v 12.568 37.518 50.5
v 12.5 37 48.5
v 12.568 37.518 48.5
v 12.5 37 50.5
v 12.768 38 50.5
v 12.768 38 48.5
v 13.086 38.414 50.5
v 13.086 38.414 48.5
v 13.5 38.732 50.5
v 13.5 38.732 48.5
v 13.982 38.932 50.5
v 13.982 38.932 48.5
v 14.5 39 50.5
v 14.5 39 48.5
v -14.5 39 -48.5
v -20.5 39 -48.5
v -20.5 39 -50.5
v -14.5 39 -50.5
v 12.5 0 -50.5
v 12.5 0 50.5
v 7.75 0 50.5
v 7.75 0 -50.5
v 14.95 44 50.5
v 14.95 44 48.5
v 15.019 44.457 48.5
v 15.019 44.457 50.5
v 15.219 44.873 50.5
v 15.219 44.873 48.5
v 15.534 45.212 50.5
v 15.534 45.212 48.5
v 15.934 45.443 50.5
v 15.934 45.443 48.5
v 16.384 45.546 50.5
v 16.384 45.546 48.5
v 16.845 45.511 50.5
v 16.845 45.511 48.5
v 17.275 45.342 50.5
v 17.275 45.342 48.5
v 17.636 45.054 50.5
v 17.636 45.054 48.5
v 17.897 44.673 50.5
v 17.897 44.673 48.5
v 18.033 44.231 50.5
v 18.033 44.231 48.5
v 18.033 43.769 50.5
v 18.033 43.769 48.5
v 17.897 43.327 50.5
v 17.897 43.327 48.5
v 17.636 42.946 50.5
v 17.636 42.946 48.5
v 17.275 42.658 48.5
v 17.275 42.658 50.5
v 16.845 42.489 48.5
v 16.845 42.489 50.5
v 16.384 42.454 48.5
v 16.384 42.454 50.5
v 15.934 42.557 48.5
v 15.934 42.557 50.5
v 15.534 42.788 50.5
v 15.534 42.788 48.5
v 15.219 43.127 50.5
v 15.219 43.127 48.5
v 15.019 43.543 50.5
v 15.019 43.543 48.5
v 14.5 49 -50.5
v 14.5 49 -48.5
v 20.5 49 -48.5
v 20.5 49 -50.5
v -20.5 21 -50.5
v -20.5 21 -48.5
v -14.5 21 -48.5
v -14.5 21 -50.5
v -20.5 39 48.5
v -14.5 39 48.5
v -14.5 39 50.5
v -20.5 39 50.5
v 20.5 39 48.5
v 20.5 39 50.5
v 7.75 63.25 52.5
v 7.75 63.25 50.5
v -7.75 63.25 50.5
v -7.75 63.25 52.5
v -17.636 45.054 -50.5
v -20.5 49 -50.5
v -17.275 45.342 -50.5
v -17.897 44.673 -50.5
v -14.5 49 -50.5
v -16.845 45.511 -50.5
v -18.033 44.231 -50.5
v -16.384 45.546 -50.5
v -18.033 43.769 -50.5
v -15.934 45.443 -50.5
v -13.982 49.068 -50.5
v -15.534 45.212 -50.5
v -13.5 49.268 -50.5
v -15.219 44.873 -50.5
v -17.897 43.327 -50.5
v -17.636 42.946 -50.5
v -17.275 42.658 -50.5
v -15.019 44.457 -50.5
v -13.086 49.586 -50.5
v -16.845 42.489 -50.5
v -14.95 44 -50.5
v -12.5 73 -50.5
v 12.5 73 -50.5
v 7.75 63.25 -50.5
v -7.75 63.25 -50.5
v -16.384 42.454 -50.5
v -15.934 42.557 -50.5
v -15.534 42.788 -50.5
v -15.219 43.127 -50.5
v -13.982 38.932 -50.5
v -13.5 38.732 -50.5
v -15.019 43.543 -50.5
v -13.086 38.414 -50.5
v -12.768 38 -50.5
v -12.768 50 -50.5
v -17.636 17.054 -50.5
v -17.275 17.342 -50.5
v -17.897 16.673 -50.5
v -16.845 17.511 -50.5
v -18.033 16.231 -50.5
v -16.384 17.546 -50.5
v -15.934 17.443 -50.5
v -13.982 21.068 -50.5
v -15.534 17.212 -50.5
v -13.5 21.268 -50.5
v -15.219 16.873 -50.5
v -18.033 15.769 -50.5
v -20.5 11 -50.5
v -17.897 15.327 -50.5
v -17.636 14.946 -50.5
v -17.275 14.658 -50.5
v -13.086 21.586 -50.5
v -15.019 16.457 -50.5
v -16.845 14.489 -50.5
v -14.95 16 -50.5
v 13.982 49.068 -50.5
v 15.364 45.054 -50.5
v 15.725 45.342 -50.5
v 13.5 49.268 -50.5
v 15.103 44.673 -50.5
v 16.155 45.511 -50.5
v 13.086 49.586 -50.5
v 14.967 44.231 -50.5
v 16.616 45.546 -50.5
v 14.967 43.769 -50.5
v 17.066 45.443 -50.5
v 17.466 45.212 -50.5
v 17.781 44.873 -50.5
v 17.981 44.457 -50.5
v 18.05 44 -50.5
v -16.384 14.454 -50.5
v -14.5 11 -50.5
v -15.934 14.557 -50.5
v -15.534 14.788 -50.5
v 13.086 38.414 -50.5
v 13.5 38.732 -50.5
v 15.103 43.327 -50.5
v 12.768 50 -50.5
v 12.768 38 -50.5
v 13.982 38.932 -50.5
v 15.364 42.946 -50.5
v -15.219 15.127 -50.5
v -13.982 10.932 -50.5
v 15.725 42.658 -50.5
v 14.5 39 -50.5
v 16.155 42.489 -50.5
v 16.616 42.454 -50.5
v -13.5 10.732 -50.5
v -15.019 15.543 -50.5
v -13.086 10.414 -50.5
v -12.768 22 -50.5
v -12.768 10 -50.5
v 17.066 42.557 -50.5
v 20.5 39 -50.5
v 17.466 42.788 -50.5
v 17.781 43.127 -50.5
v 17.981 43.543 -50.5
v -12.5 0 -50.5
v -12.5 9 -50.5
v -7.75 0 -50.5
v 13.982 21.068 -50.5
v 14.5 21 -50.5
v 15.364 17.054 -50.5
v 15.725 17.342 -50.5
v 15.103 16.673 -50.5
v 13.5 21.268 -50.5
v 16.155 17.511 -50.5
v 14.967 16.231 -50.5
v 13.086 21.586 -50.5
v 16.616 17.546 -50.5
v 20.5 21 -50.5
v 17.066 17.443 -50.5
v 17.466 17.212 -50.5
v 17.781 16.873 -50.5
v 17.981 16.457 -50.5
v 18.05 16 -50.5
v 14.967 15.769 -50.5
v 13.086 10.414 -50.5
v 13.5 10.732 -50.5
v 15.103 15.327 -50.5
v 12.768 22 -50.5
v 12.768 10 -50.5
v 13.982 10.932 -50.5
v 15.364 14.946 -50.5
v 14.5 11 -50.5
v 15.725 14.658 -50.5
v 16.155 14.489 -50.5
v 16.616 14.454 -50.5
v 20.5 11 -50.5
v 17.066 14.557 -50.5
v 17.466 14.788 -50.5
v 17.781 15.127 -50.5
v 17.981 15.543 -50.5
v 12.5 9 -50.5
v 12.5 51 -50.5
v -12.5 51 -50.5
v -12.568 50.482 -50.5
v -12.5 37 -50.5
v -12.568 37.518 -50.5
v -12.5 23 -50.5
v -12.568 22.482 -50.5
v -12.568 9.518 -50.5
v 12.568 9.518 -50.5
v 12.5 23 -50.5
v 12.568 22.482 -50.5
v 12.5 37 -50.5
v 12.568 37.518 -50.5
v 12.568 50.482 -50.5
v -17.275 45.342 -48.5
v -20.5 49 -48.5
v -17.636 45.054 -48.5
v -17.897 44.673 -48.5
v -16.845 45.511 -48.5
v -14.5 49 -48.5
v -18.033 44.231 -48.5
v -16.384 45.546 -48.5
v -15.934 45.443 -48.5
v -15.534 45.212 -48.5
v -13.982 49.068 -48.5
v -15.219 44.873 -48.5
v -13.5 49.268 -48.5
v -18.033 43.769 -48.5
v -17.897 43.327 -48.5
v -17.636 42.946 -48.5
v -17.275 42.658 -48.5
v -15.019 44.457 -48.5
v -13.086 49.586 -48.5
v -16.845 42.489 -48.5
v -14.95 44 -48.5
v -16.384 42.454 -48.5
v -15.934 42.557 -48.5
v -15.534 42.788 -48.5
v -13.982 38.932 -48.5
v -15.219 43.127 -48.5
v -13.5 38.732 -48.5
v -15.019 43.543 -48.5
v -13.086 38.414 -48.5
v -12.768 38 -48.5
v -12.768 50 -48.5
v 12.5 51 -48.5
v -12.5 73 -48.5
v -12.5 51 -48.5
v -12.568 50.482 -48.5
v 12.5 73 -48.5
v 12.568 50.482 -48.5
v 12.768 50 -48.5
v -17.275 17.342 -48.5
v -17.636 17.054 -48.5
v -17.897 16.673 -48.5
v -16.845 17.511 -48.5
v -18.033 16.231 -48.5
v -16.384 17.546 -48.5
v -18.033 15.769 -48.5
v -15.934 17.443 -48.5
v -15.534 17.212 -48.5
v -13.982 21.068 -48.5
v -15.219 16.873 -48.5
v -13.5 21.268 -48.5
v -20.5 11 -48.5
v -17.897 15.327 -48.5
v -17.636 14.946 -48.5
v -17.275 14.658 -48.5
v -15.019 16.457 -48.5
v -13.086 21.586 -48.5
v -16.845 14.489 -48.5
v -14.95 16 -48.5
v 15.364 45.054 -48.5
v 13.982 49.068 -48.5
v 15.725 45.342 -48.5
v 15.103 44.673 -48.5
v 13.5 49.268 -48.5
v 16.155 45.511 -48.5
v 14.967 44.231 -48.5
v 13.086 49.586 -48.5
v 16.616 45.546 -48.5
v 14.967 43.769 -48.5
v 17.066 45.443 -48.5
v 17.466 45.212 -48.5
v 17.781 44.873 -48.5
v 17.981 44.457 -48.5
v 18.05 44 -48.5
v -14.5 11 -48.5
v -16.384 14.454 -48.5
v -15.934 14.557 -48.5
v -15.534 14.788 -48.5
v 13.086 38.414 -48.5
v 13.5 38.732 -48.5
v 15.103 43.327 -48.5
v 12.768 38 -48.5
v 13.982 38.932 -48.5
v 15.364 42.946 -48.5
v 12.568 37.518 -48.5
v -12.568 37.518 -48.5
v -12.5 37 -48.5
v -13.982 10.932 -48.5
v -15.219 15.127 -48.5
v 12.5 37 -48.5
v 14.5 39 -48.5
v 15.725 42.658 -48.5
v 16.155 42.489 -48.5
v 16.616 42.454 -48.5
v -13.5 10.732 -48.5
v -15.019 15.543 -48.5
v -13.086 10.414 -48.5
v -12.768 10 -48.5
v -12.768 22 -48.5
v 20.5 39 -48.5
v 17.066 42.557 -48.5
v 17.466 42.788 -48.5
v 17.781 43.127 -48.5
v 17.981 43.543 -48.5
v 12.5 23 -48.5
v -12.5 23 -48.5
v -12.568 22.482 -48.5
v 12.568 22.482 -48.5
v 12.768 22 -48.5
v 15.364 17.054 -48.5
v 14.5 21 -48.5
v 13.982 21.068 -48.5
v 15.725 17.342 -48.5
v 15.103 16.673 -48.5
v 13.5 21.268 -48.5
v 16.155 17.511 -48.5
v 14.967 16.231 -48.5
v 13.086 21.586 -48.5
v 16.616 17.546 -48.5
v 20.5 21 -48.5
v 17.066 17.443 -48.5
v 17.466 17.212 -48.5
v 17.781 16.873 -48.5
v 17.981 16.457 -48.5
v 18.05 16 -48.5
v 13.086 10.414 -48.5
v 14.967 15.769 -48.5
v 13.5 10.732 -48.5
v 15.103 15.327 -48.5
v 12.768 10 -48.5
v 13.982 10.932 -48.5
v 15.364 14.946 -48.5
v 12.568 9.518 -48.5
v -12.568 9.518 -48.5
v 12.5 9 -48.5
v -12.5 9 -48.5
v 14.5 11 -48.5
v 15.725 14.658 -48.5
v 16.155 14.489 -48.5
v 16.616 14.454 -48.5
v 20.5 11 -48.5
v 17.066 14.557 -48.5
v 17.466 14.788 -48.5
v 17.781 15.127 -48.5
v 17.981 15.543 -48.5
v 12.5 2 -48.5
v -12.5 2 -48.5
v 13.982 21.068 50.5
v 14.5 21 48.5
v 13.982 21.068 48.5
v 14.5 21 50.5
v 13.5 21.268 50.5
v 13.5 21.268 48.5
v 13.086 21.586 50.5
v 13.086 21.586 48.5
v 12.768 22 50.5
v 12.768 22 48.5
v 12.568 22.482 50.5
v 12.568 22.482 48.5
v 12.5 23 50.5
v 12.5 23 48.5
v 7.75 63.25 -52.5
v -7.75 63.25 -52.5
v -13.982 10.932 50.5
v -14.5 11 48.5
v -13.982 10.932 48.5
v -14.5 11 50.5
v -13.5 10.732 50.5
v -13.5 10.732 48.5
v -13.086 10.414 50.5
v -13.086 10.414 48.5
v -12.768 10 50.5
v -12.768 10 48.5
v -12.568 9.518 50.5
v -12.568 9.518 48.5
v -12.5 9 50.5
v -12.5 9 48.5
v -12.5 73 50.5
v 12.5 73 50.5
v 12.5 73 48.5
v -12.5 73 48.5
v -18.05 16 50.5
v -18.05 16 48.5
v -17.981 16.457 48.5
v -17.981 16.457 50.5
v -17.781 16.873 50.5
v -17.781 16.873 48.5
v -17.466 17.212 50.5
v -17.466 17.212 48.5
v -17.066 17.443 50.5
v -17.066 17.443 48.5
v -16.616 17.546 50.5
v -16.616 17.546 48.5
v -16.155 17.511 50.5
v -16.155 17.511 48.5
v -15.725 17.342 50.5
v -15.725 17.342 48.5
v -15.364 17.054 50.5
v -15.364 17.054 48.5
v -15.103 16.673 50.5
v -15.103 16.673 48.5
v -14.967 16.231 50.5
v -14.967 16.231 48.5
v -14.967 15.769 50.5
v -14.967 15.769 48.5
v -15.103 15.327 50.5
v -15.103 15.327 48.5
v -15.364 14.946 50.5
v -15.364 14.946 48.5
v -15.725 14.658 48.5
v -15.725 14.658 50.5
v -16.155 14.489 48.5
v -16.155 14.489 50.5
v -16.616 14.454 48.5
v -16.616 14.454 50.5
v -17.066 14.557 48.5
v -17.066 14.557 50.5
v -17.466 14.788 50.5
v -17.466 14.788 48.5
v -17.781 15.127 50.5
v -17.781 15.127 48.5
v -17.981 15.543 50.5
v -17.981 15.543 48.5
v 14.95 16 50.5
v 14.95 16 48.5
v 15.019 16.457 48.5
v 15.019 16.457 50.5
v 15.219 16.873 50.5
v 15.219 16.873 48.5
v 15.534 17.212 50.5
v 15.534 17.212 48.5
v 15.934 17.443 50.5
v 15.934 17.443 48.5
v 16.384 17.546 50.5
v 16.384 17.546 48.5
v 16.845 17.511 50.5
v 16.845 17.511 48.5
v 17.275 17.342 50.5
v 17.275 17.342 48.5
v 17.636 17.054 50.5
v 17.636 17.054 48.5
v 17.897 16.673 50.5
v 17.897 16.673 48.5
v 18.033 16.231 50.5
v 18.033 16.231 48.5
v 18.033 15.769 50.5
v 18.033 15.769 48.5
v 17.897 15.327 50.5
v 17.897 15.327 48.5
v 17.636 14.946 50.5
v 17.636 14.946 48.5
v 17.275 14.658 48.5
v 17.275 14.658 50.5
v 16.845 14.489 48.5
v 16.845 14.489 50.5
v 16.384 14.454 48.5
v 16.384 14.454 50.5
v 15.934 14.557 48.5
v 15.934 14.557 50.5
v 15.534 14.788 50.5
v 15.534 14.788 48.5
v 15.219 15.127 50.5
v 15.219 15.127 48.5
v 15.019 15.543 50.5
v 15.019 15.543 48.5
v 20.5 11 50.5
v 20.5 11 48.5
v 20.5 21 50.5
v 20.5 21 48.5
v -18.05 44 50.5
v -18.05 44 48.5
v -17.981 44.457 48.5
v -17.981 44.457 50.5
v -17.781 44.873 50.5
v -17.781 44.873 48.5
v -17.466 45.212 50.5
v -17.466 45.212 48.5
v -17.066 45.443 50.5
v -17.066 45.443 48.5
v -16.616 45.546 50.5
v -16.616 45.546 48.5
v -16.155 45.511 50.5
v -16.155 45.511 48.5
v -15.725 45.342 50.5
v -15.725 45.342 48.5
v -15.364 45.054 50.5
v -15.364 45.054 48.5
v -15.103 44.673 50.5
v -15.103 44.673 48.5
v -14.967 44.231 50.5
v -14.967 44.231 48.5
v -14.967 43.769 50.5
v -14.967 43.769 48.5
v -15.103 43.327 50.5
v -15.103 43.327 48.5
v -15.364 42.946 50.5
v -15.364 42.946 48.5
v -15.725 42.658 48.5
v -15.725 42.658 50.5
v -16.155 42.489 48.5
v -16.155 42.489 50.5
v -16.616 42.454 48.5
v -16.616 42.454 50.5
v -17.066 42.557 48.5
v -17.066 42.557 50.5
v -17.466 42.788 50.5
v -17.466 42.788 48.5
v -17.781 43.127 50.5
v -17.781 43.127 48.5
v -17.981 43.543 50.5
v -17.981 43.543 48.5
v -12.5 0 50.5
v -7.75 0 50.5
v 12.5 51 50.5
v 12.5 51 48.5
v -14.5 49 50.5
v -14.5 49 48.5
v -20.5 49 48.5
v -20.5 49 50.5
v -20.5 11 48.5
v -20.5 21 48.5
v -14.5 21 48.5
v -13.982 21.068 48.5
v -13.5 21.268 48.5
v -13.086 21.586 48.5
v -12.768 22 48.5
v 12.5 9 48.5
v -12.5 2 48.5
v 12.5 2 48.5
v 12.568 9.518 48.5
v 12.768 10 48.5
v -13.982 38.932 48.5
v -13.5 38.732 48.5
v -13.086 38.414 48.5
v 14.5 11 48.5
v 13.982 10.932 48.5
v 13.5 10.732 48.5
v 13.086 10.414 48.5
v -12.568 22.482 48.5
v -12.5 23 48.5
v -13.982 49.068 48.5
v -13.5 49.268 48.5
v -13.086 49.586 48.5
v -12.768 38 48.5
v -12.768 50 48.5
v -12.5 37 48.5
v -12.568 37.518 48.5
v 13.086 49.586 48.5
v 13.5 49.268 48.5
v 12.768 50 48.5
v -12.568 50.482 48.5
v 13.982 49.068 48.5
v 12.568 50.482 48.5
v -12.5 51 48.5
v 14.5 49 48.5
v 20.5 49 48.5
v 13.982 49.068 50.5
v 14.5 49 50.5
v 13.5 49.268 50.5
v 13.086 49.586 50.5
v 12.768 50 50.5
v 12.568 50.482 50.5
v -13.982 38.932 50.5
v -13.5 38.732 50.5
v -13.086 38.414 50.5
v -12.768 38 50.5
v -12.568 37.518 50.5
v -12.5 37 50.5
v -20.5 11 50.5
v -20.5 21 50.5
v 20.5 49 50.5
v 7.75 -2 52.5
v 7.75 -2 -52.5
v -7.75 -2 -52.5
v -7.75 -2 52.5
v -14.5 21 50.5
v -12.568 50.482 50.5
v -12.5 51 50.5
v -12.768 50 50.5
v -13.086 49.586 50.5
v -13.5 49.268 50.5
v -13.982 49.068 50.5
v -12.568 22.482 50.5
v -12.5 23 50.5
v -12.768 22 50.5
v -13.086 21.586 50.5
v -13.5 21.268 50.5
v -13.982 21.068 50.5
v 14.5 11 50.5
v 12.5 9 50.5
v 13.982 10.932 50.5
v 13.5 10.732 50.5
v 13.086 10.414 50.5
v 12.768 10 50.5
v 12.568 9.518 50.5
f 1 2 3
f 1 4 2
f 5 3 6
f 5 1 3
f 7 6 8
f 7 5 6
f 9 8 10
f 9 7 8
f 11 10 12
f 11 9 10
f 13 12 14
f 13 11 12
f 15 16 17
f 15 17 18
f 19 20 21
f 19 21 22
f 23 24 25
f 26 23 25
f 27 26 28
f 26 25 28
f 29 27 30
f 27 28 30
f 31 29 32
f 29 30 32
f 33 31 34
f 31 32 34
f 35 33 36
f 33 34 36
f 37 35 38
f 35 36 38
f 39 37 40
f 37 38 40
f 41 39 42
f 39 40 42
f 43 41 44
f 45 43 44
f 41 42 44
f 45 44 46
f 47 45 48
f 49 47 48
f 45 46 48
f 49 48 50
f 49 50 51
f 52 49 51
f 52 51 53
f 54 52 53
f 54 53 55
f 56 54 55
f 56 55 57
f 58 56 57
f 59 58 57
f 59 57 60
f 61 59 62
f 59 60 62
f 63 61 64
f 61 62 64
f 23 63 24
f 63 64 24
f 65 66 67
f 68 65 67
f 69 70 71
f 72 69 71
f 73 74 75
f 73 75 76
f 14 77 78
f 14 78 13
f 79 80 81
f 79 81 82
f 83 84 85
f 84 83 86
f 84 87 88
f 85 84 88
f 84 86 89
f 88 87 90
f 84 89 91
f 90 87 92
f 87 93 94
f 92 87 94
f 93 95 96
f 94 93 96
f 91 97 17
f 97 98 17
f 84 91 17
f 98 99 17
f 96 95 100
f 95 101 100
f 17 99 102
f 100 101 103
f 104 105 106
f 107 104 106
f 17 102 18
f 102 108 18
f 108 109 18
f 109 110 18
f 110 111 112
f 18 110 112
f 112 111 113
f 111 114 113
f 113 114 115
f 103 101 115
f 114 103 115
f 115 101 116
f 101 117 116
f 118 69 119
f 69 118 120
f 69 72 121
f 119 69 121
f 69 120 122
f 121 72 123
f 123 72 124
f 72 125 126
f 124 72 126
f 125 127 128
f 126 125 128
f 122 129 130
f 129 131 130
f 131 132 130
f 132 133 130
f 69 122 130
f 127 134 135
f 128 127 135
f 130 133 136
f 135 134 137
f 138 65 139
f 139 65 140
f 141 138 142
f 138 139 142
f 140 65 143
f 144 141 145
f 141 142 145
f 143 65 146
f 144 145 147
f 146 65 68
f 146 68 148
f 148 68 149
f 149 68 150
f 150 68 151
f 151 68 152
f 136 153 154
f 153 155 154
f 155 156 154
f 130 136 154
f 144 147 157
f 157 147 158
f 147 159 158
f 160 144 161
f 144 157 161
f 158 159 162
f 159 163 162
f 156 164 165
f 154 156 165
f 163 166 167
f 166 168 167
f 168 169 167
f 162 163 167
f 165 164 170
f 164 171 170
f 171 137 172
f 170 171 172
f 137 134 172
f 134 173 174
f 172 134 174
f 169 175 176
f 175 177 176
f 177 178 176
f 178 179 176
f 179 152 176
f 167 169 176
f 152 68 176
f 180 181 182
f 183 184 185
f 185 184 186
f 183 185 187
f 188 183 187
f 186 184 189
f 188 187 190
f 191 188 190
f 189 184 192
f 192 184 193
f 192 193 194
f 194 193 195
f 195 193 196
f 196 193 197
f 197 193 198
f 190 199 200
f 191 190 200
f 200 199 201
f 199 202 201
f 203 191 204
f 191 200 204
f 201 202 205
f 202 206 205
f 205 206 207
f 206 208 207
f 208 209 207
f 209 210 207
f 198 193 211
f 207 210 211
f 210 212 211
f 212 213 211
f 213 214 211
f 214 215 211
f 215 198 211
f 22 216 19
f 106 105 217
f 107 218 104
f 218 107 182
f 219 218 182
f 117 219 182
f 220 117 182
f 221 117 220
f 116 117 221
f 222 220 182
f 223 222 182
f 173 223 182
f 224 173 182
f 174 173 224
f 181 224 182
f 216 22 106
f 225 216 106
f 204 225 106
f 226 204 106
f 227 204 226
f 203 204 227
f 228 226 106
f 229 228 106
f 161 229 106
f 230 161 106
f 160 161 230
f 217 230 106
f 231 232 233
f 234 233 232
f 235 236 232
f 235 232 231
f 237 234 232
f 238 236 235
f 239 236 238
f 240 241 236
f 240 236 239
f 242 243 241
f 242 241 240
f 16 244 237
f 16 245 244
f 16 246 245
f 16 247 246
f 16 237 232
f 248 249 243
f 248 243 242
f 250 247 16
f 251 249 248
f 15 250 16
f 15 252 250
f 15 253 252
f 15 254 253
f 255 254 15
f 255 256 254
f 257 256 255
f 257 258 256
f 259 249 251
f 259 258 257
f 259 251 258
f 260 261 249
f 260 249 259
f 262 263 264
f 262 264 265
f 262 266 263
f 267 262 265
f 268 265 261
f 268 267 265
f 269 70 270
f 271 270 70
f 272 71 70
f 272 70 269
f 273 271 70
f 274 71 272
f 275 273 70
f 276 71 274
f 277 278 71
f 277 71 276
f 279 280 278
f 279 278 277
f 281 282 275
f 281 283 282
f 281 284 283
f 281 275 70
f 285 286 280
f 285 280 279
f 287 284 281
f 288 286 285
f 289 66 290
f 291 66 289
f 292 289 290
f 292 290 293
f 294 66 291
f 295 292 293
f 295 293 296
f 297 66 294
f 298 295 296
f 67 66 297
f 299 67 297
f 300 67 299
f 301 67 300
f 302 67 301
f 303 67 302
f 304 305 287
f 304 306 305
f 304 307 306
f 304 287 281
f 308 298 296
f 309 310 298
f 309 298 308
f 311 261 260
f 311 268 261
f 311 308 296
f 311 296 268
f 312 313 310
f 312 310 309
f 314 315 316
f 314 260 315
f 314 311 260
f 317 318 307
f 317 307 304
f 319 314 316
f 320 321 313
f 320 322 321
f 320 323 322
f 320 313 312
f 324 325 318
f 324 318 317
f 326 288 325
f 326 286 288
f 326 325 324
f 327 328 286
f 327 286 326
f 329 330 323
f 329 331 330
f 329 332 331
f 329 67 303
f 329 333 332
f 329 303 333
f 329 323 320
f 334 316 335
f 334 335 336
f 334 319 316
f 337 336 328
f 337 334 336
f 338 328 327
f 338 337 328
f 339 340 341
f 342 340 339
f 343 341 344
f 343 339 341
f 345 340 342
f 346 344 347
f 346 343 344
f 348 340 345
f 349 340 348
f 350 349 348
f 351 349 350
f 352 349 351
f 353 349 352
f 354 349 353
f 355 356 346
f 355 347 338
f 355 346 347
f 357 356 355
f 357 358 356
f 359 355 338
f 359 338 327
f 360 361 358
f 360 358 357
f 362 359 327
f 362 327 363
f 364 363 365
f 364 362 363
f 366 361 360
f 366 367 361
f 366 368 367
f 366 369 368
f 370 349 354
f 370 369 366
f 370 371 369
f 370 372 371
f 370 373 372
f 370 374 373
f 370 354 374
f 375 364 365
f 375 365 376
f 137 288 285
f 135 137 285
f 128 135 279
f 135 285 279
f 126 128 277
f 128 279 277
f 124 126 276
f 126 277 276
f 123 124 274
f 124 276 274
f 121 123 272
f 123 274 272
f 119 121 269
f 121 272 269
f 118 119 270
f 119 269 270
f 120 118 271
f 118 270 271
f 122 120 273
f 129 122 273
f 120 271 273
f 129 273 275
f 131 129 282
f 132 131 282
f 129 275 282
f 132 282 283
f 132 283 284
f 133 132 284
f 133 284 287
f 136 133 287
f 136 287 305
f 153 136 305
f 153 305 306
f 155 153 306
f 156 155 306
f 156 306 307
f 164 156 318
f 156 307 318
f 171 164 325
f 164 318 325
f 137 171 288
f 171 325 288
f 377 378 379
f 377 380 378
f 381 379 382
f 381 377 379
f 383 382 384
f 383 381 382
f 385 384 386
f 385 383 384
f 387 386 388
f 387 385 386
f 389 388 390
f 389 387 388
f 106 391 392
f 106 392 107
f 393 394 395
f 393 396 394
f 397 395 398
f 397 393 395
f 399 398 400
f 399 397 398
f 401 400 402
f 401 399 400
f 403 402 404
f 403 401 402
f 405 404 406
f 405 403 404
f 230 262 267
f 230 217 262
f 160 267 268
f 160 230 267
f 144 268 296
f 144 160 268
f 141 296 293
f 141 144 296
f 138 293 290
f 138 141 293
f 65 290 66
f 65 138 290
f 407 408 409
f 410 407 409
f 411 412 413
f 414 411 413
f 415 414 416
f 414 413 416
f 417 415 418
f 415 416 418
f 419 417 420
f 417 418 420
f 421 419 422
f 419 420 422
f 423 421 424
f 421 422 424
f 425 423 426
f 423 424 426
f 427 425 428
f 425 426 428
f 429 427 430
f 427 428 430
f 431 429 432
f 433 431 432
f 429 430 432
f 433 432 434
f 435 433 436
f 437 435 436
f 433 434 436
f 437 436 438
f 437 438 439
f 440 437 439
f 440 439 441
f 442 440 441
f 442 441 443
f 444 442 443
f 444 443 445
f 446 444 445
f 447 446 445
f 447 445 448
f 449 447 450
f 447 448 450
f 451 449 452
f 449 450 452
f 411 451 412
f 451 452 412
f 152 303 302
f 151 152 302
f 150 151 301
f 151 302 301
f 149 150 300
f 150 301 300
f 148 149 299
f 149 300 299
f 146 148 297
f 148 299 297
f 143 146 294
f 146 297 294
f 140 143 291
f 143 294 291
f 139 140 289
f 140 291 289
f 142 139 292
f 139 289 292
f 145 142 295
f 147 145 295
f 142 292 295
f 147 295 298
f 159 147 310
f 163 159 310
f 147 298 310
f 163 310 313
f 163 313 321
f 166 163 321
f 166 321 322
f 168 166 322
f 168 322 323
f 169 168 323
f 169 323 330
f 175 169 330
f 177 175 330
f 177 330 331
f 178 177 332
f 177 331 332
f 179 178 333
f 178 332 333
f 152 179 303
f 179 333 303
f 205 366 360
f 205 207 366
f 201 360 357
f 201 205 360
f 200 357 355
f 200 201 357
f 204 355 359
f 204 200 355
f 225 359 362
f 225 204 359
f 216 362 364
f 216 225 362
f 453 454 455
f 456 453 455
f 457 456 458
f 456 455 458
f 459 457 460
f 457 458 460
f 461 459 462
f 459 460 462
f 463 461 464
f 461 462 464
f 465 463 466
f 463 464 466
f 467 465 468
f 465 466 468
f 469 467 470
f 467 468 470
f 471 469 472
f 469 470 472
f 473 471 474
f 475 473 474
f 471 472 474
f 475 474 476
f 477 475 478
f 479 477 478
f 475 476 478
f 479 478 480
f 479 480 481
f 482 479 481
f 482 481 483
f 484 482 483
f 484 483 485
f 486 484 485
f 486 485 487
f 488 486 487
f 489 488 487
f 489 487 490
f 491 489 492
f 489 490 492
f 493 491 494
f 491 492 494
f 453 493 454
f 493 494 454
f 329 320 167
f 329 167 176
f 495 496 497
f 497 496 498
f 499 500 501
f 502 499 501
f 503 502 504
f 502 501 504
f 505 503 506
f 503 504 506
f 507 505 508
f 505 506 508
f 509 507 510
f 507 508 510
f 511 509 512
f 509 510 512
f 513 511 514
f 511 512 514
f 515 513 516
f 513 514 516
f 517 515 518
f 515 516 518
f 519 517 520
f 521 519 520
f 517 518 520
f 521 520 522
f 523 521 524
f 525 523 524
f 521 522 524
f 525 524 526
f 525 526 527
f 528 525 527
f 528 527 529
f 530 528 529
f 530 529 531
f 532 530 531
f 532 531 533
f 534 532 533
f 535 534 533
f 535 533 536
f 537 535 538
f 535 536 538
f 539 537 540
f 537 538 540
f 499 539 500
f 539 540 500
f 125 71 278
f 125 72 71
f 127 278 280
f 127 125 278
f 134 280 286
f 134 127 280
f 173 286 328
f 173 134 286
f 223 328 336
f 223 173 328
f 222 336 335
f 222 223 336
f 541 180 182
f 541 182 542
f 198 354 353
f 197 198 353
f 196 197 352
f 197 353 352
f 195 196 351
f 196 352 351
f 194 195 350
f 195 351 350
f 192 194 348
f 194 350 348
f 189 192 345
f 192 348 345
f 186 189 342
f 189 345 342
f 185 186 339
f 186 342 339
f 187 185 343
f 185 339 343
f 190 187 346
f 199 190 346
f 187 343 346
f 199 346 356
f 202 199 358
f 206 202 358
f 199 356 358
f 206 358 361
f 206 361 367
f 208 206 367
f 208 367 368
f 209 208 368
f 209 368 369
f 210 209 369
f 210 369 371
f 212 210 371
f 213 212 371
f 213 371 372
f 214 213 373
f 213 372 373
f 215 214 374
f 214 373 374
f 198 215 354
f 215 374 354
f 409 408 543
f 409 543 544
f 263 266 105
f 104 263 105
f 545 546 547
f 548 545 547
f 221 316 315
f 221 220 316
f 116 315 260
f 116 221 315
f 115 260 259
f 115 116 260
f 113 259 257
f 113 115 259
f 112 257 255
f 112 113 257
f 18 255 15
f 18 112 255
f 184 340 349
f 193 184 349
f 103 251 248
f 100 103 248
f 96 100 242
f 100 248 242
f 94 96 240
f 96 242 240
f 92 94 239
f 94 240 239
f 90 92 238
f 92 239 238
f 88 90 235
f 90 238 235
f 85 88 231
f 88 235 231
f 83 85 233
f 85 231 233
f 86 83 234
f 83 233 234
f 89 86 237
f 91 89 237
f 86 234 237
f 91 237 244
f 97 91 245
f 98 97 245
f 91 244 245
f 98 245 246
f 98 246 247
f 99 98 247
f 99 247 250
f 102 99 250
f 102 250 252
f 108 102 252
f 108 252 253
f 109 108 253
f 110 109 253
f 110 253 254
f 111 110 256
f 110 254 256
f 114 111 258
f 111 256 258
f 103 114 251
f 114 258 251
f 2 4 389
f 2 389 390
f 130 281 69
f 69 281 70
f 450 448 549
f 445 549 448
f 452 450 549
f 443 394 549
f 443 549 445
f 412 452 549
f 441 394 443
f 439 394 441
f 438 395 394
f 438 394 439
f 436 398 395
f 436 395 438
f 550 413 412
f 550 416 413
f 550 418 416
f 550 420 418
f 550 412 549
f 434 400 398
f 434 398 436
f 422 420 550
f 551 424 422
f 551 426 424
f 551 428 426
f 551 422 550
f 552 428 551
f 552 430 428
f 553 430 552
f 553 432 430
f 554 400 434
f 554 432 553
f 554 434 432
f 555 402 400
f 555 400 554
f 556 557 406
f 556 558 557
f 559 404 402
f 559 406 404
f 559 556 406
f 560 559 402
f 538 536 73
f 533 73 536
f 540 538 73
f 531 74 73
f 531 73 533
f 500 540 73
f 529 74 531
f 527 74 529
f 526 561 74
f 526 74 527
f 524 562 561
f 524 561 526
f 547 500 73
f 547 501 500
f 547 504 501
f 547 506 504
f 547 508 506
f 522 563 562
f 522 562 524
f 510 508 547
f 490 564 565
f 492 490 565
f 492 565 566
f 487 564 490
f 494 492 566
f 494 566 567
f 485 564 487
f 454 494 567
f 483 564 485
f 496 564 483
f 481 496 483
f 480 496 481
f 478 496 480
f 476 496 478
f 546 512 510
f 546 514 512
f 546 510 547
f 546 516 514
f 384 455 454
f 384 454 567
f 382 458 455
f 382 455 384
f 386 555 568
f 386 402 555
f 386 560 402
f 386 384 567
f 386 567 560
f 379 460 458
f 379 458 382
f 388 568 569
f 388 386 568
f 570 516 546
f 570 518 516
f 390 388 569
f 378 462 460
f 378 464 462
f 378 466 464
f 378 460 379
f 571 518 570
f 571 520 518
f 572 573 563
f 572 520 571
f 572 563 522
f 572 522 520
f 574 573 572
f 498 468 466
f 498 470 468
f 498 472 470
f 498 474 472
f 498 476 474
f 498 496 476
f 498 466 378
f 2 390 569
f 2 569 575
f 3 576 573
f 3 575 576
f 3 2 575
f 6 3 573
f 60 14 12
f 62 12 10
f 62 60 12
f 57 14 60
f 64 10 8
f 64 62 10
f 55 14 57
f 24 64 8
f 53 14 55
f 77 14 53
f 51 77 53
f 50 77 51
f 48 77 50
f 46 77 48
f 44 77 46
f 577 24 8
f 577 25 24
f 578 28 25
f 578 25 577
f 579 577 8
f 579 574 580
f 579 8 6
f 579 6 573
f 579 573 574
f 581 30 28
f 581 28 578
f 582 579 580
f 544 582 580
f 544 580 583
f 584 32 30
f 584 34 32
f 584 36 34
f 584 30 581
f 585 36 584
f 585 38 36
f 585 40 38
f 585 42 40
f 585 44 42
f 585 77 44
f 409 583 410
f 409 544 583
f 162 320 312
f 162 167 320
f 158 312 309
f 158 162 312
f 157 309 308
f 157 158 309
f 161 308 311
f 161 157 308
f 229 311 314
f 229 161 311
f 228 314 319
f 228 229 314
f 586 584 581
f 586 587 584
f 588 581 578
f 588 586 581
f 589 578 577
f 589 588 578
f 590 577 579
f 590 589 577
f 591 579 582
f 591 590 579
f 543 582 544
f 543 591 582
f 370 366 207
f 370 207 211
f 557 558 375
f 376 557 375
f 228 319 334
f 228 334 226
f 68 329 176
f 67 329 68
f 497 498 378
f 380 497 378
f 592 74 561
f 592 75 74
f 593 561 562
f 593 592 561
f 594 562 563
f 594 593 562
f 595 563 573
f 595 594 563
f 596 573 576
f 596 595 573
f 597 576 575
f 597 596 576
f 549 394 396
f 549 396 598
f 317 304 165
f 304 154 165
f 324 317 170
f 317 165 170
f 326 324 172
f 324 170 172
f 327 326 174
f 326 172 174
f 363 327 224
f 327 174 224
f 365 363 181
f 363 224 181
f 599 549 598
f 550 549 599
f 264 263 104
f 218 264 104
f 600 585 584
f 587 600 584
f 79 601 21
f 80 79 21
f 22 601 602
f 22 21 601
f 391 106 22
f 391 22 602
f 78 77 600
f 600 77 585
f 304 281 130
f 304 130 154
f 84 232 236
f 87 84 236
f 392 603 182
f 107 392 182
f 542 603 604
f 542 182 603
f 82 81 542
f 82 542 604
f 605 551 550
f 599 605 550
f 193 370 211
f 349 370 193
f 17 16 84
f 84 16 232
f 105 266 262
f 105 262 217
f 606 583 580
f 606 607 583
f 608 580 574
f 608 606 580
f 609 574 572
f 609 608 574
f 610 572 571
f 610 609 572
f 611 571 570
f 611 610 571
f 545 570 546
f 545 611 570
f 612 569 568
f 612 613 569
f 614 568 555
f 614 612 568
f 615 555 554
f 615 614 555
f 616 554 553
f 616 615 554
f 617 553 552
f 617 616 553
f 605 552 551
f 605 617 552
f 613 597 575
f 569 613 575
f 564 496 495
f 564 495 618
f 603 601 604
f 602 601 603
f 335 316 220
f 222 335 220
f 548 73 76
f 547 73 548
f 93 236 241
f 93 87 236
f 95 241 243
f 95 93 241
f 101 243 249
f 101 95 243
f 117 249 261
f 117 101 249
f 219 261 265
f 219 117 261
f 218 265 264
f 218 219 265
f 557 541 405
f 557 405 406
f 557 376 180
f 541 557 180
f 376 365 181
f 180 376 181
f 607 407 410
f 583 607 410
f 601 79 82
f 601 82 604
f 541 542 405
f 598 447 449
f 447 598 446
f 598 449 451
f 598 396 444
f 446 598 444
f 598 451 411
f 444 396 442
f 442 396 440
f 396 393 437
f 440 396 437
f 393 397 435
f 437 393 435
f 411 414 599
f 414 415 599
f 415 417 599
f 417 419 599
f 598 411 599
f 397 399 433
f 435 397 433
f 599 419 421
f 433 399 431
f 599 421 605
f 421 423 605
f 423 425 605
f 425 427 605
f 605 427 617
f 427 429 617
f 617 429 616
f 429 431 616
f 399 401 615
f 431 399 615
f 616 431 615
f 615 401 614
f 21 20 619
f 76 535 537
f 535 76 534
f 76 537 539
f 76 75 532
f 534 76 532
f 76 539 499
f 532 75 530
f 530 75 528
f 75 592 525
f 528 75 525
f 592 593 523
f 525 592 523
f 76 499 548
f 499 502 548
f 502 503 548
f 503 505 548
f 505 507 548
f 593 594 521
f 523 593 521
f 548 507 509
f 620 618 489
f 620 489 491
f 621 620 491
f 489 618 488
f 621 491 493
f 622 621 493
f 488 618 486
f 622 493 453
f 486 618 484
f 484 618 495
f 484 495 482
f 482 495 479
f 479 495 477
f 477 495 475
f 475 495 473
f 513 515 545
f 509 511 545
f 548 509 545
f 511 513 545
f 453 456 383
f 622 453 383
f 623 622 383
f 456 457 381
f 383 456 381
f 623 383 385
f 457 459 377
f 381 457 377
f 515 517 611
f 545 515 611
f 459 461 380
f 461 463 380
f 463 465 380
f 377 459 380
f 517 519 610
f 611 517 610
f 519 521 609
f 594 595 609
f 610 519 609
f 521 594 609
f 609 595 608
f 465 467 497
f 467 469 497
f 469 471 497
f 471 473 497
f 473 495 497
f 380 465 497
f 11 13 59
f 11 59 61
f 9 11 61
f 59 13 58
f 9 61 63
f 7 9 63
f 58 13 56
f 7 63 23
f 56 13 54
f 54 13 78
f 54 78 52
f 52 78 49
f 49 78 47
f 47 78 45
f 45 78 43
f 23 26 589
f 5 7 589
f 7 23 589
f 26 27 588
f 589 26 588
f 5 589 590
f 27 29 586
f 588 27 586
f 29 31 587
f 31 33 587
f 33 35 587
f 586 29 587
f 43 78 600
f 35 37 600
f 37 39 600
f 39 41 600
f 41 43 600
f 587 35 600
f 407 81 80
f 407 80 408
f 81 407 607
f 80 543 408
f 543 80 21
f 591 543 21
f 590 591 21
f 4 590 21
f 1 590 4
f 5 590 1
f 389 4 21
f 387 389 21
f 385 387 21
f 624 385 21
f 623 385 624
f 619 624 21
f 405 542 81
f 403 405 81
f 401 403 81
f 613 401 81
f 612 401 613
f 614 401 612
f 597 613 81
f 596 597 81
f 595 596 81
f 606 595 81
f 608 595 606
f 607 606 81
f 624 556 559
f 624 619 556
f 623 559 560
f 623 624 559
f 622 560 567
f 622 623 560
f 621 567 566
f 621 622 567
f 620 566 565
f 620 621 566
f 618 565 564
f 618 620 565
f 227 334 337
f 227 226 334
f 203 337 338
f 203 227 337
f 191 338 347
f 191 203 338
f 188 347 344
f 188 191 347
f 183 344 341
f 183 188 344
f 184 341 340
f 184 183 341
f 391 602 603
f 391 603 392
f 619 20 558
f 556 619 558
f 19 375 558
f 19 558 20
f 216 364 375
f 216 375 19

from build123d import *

# Parameters (mm, degrees)
SKETCH1_W           = 105
SKETCH1_H           = 4
SKETCH1_W_2         = 2
SKETCH1_H_2         = 9.75
BOSS_EXTRUDE1_DEPTH = 12.5
SKETCH2_W           = 8
SKETCH2_H           = 10
SKETCH2_R           = 1.55
BOSS_EXTRUDE2_DEPTH = 2
SKETCH4_W           = 8
SKETCH4_H           = 10
SKETCH4_R           = 1.55
BOSS_EXTRUDE3_DEPTH = 2
SKETCH5_W           = 101
SKETCH5_H           = 2
CUT_EXTRUDE1_DEPTH  = 4.75
SKETCH6_W           = 101
SKETCH6_H           = 2
CUT_EXTRUDE2_DEPTH  = 4.75
FILLET1_R           = 2


with BuildPart() as part:
    # Sketch1 → Boss-Extrude1 (new body, symmetric)
    with BuildSketch(Plane(origin=(0, 0, 0), x_dir=(0, 0, -1), z_dir=(1, 0, 0))):
        Rectangle(SKETCH1_W, SKETCH1_H)
        Polygon((-52.5, 63.25), (-52.5, 2), (-48.5, 2), (-48.5, 63.25), (-50.5, 63.25), align=None)
        Polygon((48.5, 63.25), (48.5, 2), (52.5, 2), (52.5, 63.25), (50.5, 63.25), align=None)
        with Locations((-49.5, 68.125)):
            Rectangle(SKETCH1_W_2, SKETCH1_H_2)
        with Locations((49.5, 68.125)):
            Rectangle(SKETCH1_W_2, SKETCH1_H_2)
    extrude(amount=BOSS_EXTRUDE1_DEPTH, both=True)

    # Sketch2 → Boss-Extrude2 (add)
    with BuildSketch(Plane.XY.offset(-48.5)):
        with Locations((-16.5, 16)):
            Rectangle(SKETCH2_W, SKETCH2_H)
        with Locations((-16.5, 16)):
            Circle(SKETCH2_R, mode=Mode.SUBTRACT)
        with Locations((-16.5, 44)):
            Rectangle(SKETCH2_W, SKETCH2_H)
        with Locations((-16.5, 44)):
            Circle(SKETCH2_R, mode=Mode.SUBTRACT)
        with Locations((16.5, 16)):
            Rectangle(SKETCH2_W, SKETCH2_H)
        with Locations((16.5, 16)):
            Circle(SKETCH2_R, mode=Mode.SUBTRACT)
        with Locations((16.5, 44)):
            Rectangle(SKETCH2_W, SKETCH2_H)
        with Locations((16.5, 44)):
            Circle(SKETCH2_R, mode=Mode.SUBTRACT)
    extrude(amount=-BOSS_EXTRUDE2_DEPTH)

    # Sketch4 → Boss-Extrude3 (add)
    with BuildSketch(Plane(origin=(0, 0, 48.5), x_dir=(-1, 0, 0), z_dir=(0, 0, -1))):
        with Locations((-16.5, 16)):
            Rectangle(SKETCH4_W, SKETCH4_H)
        with Locations((-16.5, 16)):
            Circle(SKETCH4_R, mode=Mode.SUBTRACT)
        with Locations((-16.5, 44)):
            Rectangle(SKETCH4_W, SKETCH4_H)
        with Locations((-16.5, 44)):
            Circle(SKETCH4_R, mode=Mode.SUBTRACT)
        with Locations((16.5, 16)):
            Rectangle(SKETCH4_W, SKETCH4_H)
        with Locations((16.5, 16)):
            Circle(SKETCH4_R, mode=Mode.SUBTRACT)
        with Locations((16.5, 44)):
            Rectangle(SKETCH4_W, SKETCH4_H)
        with Locations((16.5, 44)):
            Circle(SKETCH4_R, mode=Mode.SUBTRACT)
    extrude(amount=-BOSS_EXTRUDE3_DEPTH)

    # Sketch5 → Cut-Extrude1 (cut)
    with BuildSketch(Plane.ZY.offset(12.5)):
        Polygon((-50.5, 63.25), (-52.5, 63.25), (-52.5, -2), (-50.5, -2), (-50.5, 0), (-50.5, 11), (-50.5, 21), (-50.5, 39), (-50.5, 49), align=None)
        with Locations((0, -1)):
            Rectangle(SKETCH5_W, SKETCH5_H)
        Polygon((50.5, 0), (50.5, -2), (52.5, -2), (52.5, 63.25), (50.5, 63.25), (50.5, 49), (50.5, 39), (50.5, 21), (50.5, 11), align=None)
    extrude(amount=-CUT_EXTRUDE1_DEPTH, mode=Mode.SUBTRACT)

    # Sketch6 → Cut-Extrude2 (cut)
    with BuildSketch(Plane(origin=(12.5, 0, 0), x_dir=(0, 0, -1), z_dir=(1, 0, 0))):
        Polygon((-50.5, 0), (-50.5, 63.25), (-52.5, 63.25), (-52.5, -2), (-50.5, -2), align=None)
        with Locations((0, -1)):
            Rectangle(SKETCH6_W, SKETCH6_H)
        Polygon((50.5, 63.25), (50.5, 0), (50.5, -2), (52.5, -2), (52.5, 63.25), align=None)
    extrude(amount=-CUT_EXTRUDE2_DEPTH, mode=Mode.SUBTRACT)

    # Fillet1
    fillet1_edges = [part.edges().sort_by_distance(p)[0] for p in [
        (12.5, 21, 49.5),
        (12.5, 11, 49.5),
        (12.5, 49, 49.5),
        (12.5, 39, 49.5),
        (-12.5, 11, 49.5),
        (-12.5, 21, 49.5),
        (-12.5, 39, 49.5),
        (-12.5, 49, 49.5),
        (-12.5, 21, -49.5),
        (-12.5, 11, -49.5),
        (-12.5, 49, -49.5),
        (-12.5, 39, -49.5),
        (12.5, 11, -49.5),
        (12.5, 21, -49.5),
        (12.5, 39, -49.5),
        (12.5, 49, -49.5),
    ]]
    fillet(fillet1_edges, radius=FILLET1_R)


solid = part.part
